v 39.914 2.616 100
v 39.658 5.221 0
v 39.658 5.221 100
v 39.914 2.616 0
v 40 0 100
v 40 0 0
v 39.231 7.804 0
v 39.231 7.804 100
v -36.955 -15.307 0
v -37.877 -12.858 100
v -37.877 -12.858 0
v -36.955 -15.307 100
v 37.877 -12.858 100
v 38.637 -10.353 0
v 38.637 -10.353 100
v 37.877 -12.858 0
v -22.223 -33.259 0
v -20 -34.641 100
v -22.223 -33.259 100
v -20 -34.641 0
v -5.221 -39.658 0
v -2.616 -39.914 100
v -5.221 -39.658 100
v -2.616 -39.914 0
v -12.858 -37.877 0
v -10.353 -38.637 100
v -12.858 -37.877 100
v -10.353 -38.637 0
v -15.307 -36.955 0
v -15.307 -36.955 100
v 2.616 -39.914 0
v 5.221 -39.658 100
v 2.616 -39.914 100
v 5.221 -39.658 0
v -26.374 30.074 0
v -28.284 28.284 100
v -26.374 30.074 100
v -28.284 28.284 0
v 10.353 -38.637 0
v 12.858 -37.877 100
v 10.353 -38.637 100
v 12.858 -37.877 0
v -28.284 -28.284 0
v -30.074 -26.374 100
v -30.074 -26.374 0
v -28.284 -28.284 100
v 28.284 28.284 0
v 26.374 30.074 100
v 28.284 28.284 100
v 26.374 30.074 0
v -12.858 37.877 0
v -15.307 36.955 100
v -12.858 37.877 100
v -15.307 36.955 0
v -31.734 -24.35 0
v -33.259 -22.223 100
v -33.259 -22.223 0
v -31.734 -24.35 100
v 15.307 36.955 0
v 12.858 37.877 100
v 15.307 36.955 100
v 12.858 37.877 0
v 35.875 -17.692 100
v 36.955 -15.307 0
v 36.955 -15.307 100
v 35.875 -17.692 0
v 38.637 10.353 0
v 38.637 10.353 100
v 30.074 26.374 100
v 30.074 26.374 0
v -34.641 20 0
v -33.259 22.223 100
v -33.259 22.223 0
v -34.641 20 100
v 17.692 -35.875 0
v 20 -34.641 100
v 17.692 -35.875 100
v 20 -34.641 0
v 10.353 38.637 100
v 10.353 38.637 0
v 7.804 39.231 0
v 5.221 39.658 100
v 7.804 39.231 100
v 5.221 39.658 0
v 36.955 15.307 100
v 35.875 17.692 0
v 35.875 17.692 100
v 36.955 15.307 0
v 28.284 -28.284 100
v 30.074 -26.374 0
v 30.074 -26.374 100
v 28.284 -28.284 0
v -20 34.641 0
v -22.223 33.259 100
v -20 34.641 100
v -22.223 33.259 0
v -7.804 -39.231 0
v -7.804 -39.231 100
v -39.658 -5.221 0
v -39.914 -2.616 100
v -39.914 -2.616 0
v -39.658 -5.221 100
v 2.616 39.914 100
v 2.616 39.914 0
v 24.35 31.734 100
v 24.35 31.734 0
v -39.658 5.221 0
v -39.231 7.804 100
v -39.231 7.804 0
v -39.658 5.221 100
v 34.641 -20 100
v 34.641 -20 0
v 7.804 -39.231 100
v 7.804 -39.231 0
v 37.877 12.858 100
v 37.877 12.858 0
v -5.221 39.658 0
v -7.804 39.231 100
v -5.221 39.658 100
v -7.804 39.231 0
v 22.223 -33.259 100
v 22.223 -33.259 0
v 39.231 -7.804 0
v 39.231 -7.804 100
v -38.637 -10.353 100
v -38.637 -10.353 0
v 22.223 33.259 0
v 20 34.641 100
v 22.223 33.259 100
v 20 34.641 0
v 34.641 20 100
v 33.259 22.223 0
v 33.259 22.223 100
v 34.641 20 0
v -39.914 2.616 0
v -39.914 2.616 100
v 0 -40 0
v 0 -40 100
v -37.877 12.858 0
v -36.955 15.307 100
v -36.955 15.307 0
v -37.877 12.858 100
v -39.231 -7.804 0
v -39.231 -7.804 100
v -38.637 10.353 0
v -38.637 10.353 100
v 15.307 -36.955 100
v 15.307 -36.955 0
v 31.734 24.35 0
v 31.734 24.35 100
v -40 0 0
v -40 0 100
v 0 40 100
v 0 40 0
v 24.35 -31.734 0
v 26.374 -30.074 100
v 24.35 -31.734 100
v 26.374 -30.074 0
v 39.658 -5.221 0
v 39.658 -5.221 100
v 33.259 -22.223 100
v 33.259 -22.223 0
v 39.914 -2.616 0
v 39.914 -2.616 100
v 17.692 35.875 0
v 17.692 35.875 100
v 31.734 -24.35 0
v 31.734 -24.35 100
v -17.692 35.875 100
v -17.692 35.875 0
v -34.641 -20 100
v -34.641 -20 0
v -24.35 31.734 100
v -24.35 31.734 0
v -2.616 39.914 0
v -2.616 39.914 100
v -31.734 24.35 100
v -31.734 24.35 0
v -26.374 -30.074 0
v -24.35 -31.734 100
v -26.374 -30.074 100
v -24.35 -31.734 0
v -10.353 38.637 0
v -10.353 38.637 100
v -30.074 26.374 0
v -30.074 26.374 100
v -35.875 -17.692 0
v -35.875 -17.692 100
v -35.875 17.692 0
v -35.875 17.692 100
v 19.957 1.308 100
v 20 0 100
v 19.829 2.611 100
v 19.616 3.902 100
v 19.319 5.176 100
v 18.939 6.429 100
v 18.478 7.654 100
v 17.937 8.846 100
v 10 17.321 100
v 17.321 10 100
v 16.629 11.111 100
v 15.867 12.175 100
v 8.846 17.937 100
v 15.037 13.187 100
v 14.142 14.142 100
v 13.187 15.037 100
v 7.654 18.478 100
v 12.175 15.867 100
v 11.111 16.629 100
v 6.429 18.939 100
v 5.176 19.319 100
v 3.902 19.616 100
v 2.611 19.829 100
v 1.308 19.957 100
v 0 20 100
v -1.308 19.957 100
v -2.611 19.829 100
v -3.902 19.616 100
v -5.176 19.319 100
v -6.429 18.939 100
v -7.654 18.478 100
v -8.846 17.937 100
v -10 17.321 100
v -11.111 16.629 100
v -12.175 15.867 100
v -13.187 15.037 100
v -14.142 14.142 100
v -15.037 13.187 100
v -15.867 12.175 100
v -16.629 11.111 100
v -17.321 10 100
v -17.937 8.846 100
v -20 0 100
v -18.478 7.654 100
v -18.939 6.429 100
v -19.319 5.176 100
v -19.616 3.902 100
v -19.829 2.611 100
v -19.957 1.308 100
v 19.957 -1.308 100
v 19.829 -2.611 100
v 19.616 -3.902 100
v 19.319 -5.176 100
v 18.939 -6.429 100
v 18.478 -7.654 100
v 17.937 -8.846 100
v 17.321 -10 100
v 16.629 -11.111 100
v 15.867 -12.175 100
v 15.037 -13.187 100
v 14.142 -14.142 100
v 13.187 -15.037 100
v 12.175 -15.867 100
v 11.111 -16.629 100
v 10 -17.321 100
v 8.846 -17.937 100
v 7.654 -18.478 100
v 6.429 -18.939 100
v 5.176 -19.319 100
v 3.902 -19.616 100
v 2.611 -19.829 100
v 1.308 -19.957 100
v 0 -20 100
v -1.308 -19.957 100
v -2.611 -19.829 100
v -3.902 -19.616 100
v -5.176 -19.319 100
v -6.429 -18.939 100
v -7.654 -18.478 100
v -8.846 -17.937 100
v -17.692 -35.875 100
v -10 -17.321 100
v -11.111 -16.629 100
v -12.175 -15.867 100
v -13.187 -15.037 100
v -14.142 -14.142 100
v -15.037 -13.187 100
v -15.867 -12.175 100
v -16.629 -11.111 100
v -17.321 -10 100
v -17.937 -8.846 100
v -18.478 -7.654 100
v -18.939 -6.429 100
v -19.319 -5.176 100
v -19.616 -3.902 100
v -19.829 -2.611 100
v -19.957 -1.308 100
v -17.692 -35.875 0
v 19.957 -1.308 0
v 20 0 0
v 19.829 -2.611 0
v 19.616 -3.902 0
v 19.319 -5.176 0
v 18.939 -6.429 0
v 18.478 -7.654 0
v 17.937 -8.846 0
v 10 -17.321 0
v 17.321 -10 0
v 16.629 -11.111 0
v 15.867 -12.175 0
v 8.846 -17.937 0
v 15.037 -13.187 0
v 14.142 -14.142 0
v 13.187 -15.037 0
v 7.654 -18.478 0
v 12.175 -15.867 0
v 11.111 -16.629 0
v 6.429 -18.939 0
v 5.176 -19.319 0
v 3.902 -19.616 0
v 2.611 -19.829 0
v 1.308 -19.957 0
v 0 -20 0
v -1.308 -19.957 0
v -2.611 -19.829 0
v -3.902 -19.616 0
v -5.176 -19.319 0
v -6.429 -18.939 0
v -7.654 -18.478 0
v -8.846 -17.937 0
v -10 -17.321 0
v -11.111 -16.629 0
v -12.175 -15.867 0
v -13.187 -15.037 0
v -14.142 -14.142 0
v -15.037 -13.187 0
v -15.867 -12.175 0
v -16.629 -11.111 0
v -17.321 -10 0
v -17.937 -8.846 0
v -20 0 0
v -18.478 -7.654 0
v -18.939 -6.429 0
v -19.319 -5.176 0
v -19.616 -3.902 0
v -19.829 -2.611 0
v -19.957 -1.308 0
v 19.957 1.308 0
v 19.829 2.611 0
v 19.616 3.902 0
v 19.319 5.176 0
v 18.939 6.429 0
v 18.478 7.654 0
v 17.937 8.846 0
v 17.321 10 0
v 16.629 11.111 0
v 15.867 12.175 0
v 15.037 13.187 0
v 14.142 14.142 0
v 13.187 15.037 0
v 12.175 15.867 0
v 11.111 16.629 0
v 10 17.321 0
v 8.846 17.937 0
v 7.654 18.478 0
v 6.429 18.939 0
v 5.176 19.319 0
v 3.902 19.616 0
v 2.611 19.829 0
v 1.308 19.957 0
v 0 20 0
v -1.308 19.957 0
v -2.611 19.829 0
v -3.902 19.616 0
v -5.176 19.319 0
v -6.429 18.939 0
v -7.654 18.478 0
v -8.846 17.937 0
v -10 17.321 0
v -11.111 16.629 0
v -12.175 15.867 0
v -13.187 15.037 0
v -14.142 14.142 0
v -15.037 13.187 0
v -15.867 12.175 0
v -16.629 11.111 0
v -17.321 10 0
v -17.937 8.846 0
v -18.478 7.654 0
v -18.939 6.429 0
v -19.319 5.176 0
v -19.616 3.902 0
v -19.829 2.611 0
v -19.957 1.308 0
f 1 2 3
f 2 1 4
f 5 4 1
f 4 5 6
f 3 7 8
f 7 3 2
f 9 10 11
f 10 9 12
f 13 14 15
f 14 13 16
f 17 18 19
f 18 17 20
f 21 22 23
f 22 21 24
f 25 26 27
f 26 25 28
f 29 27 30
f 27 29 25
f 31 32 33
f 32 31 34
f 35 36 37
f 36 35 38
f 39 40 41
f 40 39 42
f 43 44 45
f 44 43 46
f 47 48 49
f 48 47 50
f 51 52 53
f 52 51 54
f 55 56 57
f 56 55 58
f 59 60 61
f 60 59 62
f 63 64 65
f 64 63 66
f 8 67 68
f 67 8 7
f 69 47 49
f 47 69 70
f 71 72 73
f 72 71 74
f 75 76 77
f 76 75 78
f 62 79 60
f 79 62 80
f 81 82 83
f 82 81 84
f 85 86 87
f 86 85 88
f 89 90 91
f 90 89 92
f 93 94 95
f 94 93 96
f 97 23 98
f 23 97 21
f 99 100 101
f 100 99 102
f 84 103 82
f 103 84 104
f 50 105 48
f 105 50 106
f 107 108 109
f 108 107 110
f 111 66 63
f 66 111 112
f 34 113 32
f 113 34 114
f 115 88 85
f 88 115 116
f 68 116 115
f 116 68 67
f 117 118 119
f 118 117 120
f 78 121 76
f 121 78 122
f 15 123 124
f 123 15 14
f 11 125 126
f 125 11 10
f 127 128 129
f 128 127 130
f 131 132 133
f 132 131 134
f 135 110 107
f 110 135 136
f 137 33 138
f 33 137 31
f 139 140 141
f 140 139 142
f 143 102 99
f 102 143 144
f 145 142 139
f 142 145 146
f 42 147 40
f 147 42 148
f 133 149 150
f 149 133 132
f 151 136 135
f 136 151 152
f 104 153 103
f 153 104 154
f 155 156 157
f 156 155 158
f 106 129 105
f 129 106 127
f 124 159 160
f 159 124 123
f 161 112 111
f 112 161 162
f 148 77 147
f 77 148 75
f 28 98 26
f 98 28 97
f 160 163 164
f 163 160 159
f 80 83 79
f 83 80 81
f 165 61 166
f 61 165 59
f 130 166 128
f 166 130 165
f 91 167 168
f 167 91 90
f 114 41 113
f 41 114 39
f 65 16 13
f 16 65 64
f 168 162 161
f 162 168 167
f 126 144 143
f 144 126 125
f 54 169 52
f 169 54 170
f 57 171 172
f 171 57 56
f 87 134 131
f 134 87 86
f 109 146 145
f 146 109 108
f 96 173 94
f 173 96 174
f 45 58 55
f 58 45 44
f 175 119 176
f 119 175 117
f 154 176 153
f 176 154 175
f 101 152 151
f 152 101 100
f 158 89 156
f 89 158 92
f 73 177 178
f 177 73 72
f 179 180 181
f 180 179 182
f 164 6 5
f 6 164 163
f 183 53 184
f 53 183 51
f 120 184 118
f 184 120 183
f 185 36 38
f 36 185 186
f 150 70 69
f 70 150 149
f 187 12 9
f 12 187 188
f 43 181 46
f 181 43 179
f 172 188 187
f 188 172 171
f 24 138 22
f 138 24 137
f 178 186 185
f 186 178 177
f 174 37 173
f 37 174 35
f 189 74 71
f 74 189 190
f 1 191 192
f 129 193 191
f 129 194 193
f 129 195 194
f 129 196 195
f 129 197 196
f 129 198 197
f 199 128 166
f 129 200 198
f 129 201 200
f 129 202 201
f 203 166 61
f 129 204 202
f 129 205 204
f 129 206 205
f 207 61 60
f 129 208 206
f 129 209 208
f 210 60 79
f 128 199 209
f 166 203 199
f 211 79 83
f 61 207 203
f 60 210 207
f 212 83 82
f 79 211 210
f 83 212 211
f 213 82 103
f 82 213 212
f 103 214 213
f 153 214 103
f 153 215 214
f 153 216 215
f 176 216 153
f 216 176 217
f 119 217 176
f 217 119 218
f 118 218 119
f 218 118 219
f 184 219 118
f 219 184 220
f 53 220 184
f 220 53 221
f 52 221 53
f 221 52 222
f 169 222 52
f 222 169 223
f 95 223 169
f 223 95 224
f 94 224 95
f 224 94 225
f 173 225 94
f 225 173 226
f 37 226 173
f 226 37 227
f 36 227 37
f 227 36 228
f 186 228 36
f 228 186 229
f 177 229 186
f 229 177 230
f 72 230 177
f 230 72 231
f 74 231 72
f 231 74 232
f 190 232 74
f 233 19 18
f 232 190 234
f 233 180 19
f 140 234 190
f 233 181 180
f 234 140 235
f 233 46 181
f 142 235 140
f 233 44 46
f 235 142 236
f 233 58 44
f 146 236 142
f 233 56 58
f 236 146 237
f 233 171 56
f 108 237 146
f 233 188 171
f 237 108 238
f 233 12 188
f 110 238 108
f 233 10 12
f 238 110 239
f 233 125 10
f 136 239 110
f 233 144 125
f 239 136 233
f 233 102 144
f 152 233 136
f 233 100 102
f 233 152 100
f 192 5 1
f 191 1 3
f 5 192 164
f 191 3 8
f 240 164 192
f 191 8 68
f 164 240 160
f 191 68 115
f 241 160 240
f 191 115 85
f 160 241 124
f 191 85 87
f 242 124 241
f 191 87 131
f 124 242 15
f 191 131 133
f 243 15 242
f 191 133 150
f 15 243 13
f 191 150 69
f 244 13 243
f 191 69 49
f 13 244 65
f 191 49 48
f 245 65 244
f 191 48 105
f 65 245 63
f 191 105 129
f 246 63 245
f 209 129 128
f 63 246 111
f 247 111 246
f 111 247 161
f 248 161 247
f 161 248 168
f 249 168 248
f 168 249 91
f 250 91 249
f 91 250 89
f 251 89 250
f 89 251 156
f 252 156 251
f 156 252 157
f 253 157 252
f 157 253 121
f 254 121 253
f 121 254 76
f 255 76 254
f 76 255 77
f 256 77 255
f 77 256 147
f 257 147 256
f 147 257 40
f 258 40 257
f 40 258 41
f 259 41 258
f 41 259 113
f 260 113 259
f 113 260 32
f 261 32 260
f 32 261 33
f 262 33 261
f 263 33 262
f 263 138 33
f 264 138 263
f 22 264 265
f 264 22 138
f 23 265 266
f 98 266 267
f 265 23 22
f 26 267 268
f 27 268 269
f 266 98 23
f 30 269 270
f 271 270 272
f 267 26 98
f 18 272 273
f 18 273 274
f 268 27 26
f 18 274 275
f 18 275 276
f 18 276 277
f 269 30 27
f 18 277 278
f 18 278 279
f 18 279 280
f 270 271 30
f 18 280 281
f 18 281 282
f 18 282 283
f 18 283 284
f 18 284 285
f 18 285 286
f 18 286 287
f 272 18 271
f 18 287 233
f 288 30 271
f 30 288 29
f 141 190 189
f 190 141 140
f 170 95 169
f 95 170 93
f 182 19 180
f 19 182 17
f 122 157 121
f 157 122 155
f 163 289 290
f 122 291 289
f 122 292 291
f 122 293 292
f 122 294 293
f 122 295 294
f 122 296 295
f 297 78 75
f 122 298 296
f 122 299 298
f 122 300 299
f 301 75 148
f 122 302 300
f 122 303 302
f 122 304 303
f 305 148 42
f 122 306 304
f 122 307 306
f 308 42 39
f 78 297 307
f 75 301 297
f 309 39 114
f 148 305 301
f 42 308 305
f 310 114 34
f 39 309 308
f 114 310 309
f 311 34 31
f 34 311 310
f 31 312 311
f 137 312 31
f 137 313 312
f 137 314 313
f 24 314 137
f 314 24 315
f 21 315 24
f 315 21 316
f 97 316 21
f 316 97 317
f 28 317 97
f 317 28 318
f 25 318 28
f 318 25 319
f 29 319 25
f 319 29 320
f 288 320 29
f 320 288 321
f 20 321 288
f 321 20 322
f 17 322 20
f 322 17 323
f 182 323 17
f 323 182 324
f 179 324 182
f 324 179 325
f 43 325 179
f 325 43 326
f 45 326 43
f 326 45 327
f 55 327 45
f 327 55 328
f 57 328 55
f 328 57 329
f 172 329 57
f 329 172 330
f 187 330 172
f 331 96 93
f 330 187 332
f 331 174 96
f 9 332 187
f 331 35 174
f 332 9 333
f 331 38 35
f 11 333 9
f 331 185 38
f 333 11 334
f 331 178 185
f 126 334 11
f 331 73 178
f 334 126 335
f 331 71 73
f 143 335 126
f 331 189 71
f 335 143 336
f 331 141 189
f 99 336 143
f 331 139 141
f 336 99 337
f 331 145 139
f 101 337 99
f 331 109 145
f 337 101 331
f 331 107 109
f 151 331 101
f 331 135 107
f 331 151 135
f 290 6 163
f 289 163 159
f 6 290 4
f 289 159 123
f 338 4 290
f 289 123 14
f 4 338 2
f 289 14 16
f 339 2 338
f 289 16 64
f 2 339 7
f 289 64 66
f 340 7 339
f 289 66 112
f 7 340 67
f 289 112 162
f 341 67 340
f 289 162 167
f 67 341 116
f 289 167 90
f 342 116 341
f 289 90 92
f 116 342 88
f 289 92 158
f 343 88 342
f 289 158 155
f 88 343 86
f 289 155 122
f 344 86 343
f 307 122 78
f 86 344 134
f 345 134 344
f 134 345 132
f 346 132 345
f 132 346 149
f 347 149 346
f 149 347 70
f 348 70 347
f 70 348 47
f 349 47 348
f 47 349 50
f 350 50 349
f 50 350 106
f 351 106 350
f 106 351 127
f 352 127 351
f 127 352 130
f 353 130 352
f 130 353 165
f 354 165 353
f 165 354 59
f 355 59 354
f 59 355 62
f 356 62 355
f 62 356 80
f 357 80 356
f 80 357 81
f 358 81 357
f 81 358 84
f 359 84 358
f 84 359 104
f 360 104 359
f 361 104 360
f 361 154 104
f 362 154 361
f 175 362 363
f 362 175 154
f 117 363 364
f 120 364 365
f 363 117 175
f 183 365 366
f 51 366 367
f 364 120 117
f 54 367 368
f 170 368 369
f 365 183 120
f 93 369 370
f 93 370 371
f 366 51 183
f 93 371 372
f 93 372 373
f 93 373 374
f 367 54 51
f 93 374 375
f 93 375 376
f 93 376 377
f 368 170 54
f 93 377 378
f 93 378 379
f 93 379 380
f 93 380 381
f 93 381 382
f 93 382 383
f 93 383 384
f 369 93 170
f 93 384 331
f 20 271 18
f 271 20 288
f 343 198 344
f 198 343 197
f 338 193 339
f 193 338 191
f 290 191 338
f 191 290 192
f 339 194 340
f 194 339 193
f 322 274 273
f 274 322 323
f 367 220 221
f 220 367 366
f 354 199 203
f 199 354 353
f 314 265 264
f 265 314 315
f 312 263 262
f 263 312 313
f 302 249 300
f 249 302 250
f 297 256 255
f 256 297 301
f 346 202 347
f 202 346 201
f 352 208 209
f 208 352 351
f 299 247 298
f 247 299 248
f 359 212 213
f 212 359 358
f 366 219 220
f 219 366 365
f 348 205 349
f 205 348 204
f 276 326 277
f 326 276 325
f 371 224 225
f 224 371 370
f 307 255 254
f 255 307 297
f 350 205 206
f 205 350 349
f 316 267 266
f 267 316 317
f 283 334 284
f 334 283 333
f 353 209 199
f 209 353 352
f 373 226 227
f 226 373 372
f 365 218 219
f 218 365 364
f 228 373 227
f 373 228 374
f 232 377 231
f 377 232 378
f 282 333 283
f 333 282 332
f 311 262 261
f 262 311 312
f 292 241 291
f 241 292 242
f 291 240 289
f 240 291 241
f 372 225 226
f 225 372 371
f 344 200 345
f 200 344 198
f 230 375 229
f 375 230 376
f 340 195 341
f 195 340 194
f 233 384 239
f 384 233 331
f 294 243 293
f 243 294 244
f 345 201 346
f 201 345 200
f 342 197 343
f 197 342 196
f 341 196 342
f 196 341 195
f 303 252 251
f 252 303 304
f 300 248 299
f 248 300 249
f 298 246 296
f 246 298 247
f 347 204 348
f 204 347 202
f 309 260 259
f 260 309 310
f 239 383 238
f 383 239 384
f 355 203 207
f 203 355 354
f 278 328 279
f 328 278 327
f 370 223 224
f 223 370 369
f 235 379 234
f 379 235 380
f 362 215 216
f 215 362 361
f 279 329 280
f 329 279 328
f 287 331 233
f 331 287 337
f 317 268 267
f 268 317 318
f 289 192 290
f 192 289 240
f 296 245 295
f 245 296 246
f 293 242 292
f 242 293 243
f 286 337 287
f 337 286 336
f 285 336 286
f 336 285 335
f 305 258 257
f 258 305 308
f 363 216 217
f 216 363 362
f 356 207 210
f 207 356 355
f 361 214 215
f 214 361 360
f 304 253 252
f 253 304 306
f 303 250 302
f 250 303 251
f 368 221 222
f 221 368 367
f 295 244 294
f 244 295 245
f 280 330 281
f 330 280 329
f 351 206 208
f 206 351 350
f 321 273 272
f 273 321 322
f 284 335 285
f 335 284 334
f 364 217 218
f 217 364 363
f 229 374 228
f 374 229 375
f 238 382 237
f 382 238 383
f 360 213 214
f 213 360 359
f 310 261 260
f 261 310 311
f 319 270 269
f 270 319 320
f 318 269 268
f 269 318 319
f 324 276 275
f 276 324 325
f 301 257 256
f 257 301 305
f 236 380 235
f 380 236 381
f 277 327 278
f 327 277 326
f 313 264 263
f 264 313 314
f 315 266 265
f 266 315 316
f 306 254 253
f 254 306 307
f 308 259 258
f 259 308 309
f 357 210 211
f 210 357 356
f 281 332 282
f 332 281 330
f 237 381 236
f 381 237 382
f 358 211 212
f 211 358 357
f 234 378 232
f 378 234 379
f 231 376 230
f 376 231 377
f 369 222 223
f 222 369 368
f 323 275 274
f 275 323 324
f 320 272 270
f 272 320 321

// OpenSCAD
outer_radius = 40.0;
inner_radius = 20.0;
length = 100.0;
difference() {
  cylinder(r=outer_radius, h=length, $fn=96);
  translate([0, 0, -0.01]) cylinder(r=inner_radius, h=length + 0.02, $fn=96);
}
